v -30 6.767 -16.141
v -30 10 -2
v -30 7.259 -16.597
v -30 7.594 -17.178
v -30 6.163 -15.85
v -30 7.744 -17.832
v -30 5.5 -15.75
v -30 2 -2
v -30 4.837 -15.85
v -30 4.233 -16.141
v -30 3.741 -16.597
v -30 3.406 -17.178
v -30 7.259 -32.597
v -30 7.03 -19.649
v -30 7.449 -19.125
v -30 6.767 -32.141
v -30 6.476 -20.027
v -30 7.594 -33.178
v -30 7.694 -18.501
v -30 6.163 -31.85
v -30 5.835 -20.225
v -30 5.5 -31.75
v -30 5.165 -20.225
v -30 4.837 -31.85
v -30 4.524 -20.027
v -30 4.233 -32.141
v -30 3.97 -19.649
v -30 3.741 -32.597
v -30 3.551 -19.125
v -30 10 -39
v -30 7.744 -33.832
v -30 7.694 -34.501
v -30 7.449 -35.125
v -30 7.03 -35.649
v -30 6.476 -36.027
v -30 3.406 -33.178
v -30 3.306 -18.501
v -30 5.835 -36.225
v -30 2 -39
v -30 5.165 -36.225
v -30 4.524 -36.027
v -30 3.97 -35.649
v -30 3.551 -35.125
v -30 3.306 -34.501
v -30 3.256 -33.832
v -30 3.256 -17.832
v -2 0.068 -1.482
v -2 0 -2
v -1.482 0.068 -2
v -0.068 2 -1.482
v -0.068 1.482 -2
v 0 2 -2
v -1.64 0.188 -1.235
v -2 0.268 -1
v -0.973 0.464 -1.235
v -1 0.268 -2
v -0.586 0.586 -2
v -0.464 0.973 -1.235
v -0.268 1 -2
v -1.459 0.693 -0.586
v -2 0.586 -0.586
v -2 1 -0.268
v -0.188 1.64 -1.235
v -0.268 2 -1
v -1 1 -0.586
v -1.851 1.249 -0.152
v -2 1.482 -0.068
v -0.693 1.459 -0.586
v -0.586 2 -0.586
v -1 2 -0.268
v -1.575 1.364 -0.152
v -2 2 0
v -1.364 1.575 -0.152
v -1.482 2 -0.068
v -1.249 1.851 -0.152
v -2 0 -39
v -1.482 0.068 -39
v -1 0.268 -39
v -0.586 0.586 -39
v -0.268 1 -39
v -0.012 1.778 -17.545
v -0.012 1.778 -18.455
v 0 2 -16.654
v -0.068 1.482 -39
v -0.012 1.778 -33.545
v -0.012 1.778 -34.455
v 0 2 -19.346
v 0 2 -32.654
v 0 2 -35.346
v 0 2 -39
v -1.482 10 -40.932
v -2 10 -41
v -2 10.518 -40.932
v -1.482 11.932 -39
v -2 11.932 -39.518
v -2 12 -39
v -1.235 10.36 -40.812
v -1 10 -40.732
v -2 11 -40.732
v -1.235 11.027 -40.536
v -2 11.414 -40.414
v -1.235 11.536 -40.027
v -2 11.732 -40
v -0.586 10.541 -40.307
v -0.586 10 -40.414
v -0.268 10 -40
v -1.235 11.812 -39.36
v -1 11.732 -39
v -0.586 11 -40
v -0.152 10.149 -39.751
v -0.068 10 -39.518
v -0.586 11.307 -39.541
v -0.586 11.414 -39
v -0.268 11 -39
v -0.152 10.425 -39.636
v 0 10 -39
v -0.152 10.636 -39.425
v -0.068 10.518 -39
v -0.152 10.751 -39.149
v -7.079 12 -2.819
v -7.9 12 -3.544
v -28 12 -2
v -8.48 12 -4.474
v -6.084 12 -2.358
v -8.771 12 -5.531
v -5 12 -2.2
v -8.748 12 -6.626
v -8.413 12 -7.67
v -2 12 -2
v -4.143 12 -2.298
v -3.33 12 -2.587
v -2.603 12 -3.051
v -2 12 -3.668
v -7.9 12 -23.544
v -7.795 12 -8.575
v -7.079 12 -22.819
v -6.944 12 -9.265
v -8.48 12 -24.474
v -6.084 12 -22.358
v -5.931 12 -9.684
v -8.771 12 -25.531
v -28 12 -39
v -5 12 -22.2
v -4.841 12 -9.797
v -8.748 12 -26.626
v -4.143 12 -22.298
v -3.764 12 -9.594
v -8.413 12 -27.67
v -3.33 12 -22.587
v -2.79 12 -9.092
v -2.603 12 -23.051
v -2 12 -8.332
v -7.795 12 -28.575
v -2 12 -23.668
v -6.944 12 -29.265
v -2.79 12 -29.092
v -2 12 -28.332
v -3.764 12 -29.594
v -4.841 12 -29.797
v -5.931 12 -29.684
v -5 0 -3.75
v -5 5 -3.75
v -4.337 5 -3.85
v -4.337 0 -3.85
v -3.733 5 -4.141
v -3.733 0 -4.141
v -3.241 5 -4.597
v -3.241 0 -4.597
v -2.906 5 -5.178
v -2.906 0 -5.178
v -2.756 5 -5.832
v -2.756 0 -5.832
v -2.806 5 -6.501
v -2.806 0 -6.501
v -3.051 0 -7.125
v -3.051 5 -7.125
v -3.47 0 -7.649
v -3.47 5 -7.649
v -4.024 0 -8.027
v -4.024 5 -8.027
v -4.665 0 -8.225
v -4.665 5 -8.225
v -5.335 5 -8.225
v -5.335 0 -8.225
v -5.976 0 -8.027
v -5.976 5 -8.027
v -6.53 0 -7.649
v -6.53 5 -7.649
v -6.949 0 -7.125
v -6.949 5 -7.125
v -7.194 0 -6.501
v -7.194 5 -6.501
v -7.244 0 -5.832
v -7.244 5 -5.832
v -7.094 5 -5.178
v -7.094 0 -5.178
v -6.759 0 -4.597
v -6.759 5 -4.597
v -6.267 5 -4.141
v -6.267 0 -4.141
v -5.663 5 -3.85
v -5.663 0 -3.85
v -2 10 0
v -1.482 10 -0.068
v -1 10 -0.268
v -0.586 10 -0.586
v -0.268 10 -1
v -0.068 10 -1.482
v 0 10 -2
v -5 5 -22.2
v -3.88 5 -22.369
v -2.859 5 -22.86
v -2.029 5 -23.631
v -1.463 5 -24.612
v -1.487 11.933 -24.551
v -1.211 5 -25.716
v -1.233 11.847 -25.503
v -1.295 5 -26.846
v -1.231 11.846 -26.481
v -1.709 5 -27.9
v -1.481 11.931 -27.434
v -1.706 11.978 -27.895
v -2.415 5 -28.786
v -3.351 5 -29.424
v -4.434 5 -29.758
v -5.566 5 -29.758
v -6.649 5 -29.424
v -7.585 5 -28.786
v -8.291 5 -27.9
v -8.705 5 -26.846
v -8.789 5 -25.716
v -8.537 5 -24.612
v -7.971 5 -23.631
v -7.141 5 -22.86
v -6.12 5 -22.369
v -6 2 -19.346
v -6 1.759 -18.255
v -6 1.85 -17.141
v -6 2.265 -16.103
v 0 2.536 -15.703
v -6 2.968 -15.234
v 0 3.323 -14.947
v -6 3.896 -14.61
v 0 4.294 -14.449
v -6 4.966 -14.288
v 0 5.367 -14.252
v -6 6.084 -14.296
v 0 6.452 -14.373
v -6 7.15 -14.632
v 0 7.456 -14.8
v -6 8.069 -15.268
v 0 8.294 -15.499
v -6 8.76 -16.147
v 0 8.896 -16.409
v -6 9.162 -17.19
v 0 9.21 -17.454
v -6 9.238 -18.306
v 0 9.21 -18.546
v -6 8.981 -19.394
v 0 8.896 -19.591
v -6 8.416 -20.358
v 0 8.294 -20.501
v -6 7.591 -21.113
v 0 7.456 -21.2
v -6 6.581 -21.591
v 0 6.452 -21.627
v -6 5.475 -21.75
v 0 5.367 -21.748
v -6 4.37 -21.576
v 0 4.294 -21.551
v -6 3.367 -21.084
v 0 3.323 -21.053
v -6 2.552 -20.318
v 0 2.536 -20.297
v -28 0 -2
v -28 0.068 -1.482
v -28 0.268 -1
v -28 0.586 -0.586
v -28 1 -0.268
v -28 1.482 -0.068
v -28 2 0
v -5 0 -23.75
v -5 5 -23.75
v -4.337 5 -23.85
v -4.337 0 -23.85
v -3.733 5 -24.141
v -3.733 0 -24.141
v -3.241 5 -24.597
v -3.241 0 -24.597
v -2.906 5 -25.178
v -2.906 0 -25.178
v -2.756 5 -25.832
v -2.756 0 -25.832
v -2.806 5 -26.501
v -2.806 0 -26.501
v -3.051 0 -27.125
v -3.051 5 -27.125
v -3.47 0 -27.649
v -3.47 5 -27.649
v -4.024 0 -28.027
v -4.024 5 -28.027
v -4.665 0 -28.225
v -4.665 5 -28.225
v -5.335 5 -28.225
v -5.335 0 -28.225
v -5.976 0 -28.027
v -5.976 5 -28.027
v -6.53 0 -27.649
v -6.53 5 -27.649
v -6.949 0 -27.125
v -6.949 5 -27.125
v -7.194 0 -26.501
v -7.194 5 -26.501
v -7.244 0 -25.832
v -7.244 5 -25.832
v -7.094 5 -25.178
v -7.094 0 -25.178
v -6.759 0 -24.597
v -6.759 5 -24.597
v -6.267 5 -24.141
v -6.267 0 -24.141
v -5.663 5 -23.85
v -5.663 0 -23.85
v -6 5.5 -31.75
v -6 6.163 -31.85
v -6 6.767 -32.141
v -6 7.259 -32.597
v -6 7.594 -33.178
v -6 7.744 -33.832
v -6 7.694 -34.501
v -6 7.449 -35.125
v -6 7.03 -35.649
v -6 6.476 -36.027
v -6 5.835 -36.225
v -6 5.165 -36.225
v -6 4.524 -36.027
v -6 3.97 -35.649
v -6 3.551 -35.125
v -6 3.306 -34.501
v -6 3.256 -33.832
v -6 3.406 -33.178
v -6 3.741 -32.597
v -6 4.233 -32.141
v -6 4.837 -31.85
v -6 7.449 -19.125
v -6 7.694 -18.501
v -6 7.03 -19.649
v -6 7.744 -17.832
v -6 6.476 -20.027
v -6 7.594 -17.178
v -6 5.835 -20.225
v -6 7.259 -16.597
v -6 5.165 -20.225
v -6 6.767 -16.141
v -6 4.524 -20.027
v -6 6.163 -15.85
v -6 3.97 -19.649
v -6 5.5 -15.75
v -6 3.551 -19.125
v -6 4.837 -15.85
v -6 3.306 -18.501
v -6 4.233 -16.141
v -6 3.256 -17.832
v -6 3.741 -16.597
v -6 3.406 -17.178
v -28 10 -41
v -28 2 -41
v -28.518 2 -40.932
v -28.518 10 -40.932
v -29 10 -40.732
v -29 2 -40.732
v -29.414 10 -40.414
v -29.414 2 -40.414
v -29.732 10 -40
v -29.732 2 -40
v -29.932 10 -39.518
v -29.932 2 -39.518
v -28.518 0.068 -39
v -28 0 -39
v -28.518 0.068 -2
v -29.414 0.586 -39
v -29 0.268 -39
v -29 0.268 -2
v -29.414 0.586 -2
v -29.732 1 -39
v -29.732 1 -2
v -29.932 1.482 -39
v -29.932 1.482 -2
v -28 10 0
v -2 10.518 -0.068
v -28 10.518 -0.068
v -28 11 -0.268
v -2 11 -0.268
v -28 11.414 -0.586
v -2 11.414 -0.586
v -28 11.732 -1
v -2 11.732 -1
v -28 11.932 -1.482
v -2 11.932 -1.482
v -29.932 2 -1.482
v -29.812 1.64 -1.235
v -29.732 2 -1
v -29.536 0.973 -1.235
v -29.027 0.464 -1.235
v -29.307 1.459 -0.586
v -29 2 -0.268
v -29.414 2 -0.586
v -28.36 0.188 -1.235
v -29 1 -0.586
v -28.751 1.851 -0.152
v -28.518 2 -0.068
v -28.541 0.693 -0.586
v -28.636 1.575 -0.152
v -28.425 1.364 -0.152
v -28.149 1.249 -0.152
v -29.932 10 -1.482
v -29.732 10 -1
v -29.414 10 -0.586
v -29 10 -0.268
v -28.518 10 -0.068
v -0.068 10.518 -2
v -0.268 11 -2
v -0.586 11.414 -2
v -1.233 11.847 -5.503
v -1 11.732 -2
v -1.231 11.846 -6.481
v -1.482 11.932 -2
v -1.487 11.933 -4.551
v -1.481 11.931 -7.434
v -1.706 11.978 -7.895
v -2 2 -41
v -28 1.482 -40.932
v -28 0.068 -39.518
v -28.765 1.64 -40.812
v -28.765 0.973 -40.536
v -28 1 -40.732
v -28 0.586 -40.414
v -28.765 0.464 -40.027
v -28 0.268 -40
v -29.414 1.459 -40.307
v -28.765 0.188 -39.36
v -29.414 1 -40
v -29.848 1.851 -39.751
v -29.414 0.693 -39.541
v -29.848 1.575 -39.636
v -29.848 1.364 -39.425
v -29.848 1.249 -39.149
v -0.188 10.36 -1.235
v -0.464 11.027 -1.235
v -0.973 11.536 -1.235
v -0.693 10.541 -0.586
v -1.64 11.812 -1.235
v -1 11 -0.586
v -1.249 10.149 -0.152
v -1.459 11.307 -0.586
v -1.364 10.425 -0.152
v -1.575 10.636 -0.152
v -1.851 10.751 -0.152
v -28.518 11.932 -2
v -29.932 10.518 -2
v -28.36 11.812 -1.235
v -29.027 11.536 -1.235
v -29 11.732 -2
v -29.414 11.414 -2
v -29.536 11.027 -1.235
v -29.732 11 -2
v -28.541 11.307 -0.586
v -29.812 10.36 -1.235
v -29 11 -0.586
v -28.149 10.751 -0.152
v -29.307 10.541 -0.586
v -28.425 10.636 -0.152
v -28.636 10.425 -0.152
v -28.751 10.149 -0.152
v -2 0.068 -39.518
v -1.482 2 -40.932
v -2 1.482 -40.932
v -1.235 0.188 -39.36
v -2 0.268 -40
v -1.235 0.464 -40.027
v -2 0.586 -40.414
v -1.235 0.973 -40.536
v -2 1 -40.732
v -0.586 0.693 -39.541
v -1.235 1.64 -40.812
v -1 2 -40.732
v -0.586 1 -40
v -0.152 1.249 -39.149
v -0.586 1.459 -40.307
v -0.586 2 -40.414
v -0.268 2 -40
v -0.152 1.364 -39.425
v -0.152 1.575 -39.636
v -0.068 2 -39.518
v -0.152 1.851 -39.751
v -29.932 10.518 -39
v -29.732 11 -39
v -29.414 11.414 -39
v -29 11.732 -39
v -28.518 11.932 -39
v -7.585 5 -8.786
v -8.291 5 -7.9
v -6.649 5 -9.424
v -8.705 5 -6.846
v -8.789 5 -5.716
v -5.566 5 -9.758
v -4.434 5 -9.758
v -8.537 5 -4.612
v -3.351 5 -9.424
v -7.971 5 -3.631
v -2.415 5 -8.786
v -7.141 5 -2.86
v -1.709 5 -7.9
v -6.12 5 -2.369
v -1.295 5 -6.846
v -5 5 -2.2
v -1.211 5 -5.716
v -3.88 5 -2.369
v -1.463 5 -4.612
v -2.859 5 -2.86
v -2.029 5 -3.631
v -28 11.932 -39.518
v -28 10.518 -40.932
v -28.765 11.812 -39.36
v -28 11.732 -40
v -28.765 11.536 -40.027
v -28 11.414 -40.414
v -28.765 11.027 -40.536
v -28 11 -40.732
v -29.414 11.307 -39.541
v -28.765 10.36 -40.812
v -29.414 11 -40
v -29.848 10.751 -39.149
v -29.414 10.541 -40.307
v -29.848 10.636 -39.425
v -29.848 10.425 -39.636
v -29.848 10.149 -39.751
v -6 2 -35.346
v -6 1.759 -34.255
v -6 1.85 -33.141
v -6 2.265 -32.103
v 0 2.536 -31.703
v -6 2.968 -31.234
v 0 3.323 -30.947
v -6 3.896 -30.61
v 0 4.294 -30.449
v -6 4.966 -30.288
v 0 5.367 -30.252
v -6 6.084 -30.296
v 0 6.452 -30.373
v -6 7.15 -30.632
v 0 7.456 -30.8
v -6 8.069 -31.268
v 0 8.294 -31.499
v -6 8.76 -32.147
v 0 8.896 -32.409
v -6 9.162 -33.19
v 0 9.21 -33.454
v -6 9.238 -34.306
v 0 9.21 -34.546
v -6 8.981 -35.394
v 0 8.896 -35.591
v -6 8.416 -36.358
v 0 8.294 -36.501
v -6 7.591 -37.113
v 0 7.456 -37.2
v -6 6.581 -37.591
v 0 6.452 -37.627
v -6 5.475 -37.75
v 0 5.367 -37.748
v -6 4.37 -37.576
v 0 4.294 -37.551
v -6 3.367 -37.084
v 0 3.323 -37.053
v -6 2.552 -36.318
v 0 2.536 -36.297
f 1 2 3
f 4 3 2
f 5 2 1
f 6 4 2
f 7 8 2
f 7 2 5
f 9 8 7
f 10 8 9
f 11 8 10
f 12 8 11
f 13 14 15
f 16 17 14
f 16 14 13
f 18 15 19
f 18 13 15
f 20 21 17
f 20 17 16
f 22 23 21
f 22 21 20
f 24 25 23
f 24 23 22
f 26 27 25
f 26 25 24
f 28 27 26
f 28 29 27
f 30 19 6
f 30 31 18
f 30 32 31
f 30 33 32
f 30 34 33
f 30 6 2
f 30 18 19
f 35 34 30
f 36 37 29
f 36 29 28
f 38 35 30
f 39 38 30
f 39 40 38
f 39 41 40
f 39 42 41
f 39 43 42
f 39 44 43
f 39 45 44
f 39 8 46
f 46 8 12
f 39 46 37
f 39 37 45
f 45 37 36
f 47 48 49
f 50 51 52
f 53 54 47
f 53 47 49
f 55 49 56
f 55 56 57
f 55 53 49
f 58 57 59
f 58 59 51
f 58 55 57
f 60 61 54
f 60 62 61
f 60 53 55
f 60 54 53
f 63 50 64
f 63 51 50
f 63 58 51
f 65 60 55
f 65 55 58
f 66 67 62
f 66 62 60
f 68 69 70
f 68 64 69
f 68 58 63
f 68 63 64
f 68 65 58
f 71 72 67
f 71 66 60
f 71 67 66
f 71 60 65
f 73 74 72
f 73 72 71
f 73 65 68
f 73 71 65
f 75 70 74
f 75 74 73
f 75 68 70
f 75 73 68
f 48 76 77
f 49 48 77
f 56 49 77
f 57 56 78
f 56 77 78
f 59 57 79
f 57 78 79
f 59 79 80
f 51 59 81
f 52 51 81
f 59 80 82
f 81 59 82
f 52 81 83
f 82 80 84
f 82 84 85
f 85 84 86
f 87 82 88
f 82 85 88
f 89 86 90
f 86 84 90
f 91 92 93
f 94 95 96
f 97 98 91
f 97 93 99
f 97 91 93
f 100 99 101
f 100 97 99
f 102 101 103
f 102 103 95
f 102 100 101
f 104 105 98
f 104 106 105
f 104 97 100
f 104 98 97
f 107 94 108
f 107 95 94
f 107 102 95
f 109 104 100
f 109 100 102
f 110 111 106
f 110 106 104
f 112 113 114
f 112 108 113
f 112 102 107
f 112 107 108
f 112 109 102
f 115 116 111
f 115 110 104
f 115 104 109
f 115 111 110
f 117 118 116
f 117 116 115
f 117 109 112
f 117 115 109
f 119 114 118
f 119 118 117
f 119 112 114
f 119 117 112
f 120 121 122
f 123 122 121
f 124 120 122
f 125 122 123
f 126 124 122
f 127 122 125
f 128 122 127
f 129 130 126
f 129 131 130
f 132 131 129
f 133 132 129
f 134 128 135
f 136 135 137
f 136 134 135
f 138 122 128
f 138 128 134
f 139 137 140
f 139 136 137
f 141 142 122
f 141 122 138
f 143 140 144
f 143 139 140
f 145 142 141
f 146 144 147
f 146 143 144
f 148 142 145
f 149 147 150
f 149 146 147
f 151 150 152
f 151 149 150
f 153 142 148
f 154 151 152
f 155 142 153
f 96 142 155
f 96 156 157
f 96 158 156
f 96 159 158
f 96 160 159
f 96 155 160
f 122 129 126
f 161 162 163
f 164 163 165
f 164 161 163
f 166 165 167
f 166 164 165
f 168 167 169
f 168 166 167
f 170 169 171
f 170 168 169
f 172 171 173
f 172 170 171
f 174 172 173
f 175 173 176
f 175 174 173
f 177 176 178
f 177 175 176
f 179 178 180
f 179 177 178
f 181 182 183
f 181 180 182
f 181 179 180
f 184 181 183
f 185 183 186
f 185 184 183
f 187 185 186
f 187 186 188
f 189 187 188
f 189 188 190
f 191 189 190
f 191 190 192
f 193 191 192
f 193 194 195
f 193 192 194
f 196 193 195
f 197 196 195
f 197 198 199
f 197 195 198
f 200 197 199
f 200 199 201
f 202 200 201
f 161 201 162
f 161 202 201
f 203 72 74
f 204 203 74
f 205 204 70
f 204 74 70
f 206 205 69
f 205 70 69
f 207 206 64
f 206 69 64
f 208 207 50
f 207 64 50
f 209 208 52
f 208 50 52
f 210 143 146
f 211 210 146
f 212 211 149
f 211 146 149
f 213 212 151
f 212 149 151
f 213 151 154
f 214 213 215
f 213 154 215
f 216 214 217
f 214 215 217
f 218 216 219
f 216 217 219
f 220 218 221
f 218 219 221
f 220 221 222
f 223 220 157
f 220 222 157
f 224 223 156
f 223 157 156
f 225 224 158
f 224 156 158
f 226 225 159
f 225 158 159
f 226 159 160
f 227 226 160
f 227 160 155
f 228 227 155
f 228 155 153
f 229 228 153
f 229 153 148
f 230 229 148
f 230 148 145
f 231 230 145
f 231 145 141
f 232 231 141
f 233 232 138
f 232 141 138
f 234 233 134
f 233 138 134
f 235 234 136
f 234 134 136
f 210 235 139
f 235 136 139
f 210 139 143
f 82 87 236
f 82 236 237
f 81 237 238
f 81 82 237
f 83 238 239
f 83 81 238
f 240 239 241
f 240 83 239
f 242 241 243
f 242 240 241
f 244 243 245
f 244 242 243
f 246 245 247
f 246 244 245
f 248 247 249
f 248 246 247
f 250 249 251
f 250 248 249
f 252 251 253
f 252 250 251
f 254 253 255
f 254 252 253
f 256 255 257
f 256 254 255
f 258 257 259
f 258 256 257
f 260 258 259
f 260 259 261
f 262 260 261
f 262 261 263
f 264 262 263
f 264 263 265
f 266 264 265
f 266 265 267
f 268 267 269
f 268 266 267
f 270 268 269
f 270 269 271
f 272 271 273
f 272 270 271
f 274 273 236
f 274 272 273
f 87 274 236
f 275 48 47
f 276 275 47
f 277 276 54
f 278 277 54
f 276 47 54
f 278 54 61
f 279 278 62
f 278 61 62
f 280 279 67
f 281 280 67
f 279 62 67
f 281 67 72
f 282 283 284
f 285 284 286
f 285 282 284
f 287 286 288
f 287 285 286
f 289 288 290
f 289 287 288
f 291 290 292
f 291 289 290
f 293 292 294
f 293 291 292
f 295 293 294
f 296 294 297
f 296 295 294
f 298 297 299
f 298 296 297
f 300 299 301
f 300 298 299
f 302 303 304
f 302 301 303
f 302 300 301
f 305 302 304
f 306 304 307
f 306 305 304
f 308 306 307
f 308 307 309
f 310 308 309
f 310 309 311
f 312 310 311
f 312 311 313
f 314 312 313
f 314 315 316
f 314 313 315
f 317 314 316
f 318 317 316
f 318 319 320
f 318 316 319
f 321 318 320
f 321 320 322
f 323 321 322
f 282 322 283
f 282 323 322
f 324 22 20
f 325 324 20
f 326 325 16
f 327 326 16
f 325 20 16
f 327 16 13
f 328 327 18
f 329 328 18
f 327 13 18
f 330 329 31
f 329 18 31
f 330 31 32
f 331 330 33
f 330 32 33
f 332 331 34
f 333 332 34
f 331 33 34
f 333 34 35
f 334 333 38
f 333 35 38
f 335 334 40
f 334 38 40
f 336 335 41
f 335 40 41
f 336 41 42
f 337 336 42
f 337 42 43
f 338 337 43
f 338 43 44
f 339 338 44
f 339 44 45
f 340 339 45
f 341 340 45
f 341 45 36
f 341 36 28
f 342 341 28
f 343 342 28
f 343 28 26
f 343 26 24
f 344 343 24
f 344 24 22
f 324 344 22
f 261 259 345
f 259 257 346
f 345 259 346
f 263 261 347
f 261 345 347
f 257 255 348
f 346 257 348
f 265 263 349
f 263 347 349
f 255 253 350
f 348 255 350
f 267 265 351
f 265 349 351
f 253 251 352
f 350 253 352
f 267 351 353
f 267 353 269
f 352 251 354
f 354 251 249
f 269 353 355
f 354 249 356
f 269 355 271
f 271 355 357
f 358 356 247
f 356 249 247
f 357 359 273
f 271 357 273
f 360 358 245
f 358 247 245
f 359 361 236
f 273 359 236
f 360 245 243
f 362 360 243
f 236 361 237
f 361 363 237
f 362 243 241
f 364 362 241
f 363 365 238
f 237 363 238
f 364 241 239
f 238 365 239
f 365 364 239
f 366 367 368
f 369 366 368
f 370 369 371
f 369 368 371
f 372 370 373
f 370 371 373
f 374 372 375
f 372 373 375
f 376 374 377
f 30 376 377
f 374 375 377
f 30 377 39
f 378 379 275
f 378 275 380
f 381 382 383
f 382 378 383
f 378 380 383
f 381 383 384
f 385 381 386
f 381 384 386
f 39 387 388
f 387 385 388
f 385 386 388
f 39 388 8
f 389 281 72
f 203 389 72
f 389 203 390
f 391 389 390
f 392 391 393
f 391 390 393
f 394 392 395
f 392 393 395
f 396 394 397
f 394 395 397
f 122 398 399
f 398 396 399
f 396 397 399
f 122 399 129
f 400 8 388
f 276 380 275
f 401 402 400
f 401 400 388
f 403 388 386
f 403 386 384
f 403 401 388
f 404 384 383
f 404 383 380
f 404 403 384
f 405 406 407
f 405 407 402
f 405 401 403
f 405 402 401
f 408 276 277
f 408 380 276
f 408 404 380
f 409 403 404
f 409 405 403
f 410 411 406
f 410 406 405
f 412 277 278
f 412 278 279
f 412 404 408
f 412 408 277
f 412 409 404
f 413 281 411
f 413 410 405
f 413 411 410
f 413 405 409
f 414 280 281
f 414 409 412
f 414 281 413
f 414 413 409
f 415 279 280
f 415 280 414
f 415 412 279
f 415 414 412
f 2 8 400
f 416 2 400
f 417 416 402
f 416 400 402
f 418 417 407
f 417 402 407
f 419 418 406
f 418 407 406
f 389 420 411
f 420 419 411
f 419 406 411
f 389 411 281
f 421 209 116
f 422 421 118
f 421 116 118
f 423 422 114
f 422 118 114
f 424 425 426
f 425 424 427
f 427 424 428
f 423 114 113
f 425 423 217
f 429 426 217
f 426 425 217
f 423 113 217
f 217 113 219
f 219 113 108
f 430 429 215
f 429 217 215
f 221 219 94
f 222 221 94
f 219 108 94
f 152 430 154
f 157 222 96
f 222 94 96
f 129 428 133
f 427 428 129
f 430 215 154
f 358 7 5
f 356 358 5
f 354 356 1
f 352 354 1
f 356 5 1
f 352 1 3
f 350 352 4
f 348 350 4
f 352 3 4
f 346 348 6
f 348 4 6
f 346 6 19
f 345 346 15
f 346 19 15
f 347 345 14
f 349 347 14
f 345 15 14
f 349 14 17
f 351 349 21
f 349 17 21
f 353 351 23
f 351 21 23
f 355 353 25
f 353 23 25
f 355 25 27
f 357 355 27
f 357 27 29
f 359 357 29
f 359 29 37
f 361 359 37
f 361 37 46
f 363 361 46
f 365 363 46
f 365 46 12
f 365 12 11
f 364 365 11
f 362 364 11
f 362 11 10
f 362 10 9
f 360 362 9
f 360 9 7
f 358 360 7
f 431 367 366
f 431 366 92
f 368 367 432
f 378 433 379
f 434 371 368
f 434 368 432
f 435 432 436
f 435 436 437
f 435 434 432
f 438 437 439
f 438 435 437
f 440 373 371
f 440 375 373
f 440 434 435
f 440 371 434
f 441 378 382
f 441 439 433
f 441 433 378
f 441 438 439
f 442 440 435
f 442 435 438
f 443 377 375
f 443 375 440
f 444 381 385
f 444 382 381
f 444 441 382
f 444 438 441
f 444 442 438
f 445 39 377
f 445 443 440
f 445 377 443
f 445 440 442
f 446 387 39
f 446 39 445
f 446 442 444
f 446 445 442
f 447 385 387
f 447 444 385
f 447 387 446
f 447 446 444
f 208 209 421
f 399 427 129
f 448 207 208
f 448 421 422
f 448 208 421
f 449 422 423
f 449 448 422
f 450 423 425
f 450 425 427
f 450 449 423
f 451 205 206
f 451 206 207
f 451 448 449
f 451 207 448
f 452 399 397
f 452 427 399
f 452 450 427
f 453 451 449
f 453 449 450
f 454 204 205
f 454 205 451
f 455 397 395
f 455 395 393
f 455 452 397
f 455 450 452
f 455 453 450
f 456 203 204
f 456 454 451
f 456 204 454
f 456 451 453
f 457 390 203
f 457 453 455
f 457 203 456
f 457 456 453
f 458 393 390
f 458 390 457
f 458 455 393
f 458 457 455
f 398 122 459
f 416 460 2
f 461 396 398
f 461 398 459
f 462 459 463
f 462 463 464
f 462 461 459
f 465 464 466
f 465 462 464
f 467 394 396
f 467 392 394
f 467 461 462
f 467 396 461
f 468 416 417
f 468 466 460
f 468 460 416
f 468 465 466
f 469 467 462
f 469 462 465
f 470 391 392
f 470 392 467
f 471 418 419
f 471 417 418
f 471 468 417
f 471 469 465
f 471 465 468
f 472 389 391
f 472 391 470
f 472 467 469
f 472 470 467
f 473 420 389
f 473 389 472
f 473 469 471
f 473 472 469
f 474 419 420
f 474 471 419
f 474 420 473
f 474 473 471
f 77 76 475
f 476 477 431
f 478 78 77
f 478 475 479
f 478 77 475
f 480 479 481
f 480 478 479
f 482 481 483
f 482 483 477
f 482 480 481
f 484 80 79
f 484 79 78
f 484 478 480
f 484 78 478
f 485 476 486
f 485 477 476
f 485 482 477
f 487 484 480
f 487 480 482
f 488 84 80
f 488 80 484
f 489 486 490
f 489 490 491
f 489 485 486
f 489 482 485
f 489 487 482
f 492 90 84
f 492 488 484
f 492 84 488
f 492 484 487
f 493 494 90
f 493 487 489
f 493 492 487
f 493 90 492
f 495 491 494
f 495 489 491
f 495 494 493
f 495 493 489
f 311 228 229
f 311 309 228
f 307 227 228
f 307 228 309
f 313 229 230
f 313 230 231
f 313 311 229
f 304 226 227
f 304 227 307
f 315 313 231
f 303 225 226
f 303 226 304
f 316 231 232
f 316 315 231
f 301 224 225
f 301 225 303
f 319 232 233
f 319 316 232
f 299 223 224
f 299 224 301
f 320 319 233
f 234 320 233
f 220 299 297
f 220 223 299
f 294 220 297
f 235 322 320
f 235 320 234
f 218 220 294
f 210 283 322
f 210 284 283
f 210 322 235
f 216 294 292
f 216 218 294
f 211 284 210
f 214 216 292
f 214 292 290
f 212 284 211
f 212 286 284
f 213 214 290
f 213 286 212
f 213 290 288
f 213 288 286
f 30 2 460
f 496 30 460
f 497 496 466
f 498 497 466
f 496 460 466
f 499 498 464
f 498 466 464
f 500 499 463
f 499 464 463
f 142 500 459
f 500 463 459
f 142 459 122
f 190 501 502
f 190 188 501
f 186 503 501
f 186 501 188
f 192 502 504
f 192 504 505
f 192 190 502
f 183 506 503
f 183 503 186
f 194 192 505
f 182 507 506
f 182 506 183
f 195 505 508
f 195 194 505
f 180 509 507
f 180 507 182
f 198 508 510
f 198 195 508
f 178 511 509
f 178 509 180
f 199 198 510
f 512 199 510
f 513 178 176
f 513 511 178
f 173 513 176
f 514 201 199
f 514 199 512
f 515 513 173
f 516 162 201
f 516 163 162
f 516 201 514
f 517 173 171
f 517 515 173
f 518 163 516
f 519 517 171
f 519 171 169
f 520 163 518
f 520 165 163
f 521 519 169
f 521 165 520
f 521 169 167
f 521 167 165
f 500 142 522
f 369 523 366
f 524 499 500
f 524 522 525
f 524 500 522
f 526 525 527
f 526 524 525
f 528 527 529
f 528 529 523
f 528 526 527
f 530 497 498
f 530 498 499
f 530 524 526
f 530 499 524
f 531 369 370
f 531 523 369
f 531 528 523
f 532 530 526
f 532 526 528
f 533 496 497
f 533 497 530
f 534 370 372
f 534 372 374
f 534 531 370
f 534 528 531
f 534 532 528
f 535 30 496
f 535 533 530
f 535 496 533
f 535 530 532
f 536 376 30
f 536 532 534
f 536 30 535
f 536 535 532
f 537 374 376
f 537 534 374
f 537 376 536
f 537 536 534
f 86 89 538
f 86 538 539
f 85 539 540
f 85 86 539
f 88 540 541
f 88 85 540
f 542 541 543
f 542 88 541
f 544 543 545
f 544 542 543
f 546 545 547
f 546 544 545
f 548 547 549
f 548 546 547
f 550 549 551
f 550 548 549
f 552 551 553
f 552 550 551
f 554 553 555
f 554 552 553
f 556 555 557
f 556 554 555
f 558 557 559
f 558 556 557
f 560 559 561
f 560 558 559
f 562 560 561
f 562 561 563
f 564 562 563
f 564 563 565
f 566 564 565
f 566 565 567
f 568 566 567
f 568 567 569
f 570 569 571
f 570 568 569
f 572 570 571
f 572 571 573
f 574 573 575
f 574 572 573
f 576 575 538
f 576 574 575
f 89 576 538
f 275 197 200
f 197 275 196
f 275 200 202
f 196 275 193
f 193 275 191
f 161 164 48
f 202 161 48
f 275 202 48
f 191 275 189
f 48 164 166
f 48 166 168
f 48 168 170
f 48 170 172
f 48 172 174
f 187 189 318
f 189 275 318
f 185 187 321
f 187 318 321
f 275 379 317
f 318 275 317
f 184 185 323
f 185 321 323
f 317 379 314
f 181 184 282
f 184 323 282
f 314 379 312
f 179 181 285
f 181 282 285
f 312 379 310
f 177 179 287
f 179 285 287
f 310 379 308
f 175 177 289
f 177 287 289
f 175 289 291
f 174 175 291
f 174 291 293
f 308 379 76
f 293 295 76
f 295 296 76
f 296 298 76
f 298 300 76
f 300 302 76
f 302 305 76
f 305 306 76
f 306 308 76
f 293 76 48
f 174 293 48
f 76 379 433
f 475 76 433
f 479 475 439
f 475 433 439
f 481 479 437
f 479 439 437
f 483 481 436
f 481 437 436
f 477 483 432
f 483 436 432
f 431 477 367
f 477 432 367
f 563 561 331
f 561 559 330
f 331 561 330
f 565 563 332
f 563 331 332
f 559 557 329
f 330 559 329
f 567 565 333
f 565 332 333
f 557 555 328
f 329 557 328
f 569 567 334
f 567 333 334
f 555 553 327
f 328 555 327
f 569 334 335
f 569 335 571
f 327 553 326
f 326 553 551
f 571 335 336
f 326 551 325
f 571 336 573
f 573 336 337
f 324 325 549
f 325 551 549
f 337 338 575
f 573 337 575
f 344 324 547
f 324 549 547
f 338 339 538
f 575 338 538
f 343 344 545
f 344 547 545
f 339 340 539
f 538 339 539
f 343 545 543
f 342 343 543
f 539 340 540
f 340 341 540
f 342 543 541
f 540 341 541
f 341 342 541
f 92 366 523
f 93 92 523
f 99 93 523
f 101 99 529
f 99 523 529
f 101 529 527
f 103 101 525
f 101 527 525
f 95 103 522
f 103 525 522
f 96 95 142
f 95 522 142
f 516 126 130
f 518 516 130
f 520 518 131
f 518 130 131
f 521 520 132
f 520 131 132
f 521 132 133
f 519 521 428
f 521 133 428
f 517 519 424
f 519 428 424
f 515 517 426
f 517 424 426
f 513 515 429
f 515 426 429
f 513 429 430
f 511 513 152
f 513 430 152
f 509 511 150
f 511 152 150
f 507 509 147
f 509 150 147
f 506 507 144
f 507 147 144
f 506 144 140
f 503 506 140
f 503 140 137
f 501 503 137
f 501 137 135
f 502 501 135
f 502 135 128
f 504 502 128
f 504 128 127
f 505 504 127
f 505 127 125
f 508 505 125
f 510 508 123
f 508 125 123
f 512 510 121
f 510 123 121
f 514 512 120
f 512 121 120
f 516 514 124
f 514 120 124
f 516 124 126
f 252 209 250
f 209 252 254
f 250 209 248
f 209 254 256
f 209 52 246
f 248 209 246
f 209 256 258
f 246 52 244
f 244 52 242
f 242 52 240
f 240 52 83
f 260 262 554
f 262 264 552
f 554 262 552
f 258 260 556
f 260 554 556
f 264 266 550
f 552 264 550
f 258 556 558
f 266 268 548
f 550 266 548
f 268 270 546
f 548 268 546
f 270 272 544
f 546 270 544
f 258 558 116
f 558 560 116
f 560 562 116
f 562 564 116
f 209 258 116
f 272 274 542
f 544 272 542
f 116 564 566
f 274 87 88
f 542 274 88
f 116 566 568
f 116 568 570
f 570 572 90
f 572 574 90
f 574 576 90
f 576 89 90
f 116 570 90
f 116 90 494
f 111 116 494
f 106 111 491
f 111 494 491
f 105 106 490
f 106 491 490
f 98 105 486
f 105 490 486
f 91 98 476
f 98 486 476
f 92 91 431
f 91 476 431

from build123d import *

# Parameters (mm, degrees)
SKETCH1_W           = 30
SKETCH1_H           = 41
SKETCH1_R           = 2.25
BOSS_EXTRUDE1_DEPTH = 12
SKETCH3_R           = 3.8
CUT_EXTRUDE2_DEPTH  = 7
FILLET1_R           = 2
SKETCH4_R           = 2.25
CUT_EXTRUDE3_DEPTH  = 53.201532625
CUT_EXTRUDE4_START  = -30
SKETCH5_R           = 3.75
CUT_EXTRUDE4_DEPTH  = 6


with BuildPart() as part:
    # Sketch1 → Boss-Extrude1 (new body)
    with BuildSketch(Plane(origin=(0, 0, 0), x_dir=(1, 0, 0), z_dir=(0, 1, 0))):
        with Locations((-15, 20.5)):
            Rectangle(SKETCH1_W, SKETCH1_H)
        with Locations(Location((-5, 6, 0), (0, 0, 270))):
            Circle(SKETCH1_R, mode=Mode.SUBTRACT)
        with Locations(Location((-5, 26, 0), (0, 0, 270))):
            Circle(SKETCH1_R, mode=Mode.SUBTRACT)
    extrude(amount=BOSS_EXTRUDE1_DEPTH)

    # Sketch3 → Cut-Extrude2 (cut)
    with BuildSketch(Plane(origin=(0, 12, 0), x_dir=(1, 0, 0), z_dir=(0, 1, 0))):
        with Locations(Location((-5, 26, 0), (0, 0, 270))):
            Circle(SKETCH3_R)
        with Locations(Location((-5, 6, 0), (0, 0, 270))):
            Circle(SKETCH3_R)
    extrude(amount=-CUT_EXTRUDE2_DEPTH, mode=Mode.SUBTRACT)

    # Fillet1
    # the kernel refuses this fillet: 2 mm, written as the material it takes off along each edge
    with BuildSketch(Plane(origin=(-28, 10, -2), x_dir=(-1, 0, 0), z_dir=(0, 0, 1))) as fillet1_piece_1_section:
        Polygon((0, 0), (FILLET1_R, 0), (FILLET1_R, -FILLET1_R), (0, -FILLET1_R), align=None)
    fillet1_piece_1 = extrude(amount=FILLET1_R, mode=Mode.PRIVATE)
    fillet1_piece_1 = fillet1_piece_1 - Plane(origin=(-28, 10, -2), x_dir=(0.7071067811865475, -0.7071067811865475, 0), z_dir=(0, 0, 1)) * Sphere(FILLET1_R, mode=Mode.PRIVATE)
    add(fillet1_piece_1, mode=Mode.SUBTRACT)
    with BuildSketch(Plane(origin=(-28, 10, -39), x_dir=(0, 1, 0), z_dir=(-1, 0, 0))) as fillet1_piece_2_section:
        Polygon((0, 0), (FILLET1_R, 0), (FILLET1_R, FILLET1_R), (0, FILLET1_R), align=None)
    fillet1_piece_2 = extrude(amount=FILLET1_R, mode=Mode.PRIVATE)
    fillet1_piece_2 = fillet1_piece_2 - Plane(origin=(-28, 10, -39), x_dir=(0, -0.7071067811865475, 0.7071067811865475), z_dir=(-1, 0, 0)) * Sphere(FILLET1_R, mode=Mode.PRIVATE)
    add(fillet1_piece_2, mode=Mode.SUBTRACT)
    with BuildSketch(Plane(origin=(-2, 10, -2), x_dir=(1, 0, 0), z_dir=(0, 0, 1))) as fillet1_piece_3_section:
        Polygon((0, 0), (FILLET1_R, 0), (FILLET1_R, FILLET1_R), (0, FILLET1_R), align=None)
    fillet1_piece_3 = extrude(amount=FILLET1_R, mode=Mode.PRIVATE)
    fillet1_piece_3 = fillet1_piece_3 - Plane(origin=(-2, 10, -2), x_dir=(-0.7071067811865475, -0.7071067811865475, 0), z_dir=(0, 0, 1)) * Sphere(FILLET1_R, mode=Mode.PRIVATE)
    add(fillet1_piece_3, mode=Mode.SUBTRACT)
    with BuildSketch(Plane(origin=(-2, 10, -39), x_dir=(0, 1, 0), z_dir=(1, 0, 0))) as fillet1_piece_4_section:
        Polygon((0, 0), (FILLET1_R, 0), (FILLET1_R, -FILLET1_R), (0, -FILLET1_R), align=None)
    fillet1_piece_4 = extrude(amount=FILLET1_R, mode=Mode.PRIVATE)
    fillet1_piece_4 = fillet1_piece_4 - Plane(origin=(-2, 10, -39), x_dir=(0, -0.7071067811865475, 0.7071067811865475), z_dir=(1, 0, 0)) * Sphere(FILLET1_R, mode=Mode.PRIVATE)
    add(fillet1_piece_4, mode=Mode.SUBTRACT)
    with BuildSketch(Plane(origin=(-2, 2, -2), x_dir=(1, 0, 0), z_dir=(0, 0, 1))) as fillet1_piece_5_section:
        Polygon((0, 0), (FILLET1_R, 0), (FILLET1_R, -FILLET1_R), (0, -FILLET1_R), align=None)
    fillet1_piece_5 = extrude(amount=FILLET1_R, mode=Mode.PRIVATE)
    fillet1_piece_5 = fillet1_piece_5 - Plane(origin=(-2, 2, -2), x_dir=(-0.7071067811865475, 0.7071067811865475, 0), z_dir=(0, 0, 1)) * Sphere(FILLET1_R, mode=Mode.PRIVATE)
    add(fillet1_piece_5, mode=Mode.SUBTRACT)
    with BuildSketch(Plane(origin=(-28, 2, -2), x_dir=(-1, 0, 0), z_dir=(0, 0, 1))) as fillet1_piece_6_section:
        Polygon((0, 0), (FILLET1_R, 0), (FILLET1_R, FILLET1_R), (0, FILLET1_R), align=None)
    fillet1_piece_6 = extrude(amount=FILLET1_R, mode=Mode.PRIVATE)
    fillet1_piece_6 = fillet1_piece_6 - Plane(origin=(-28, 2, -2), x_dir=(0.7071067811865475, 0.7071067811865475, 0), z_dir=(0, 0, 1)) * Sphere(FILLET1_R, mode=Mode.PRIVATE)
    add(fillet1_piece_6, mode=Mode.SUBTRACT)
    with BuildSketch(Plane(origin=(-28, 2, -39), x_dir=(0, -1, 0), z_dir=(-1, 0, 0))) as fillet1_piece_7_section:
        Polygon((0, 0), (FILLET1_R, 0), (FILLET1_R, -FILLET1_R), (0, -FILLET1_R), align=None)
    fillet1_piece_7 = extrude(amount=FILLET1_R, mode=Mode.PRIVATE)
    fillet1_piece_7 = fillet1_piece_7 - Plane(origin=(-28, 2, -39), x_dir=(0, 0.7071067811865475, 0.7071067811865475), z_dir=(-1, 0, 0)) * Sphere(FILLET1_R, mode=Mode.PRIVATE)
    add(fillet1_piece_7, mode=Mode.SUBTRACT)
    with BuildSketch(Plane(origin=(-2, 2, -39), x_dir=(0, -1, 0), z_dir=(1, 0, 0))) as fillet1_piece_8_section:
        Polygon((0, 0), (FILLET1_R, 0), (FILLET1_R, FILLET1_R), (0, FILLET1_R), align=None)
    fillet1_piece_8 = extrude(amount=FILLET1_R, mode=Mode.PRIVATE)
    fillet1_piece_8 = fillet1_piece_8 - Plane(origin=(-2, 2, -39), x_dir=(0, 0.7071067811865475, 0.7071067811865475), z_dir=(1, 0, 0)) * Sphere(FILLET1_R, mode=Mode.PRIVATE)
    add(fillet1_piece_8, mode=Mode.SUBTRACT)
    with BuildSketch(Plane(origin=(-30, 12, -2), x_dir=(0, -1, 0), z_dir=(0, 0, -1)), Plane(origin=(0, 12, -39), x_dir=(0, -1, 0), z_dir=(0, 0, 1))) as fillet1_piece_9:
        with BuildLine():
            CenterArc((FILLET1_R, -FILLET1_R), FILLET1_R, 90, 90)
            Line((0, -FILLET1_R), (0, 0))
            Line((0, 0), (FILLET1_R, 0))
        make_face()
    extrude(amount=37, mode=Mode.SUBTRACT)
    with BuildSketch(Plane(origin=(-2, 12, 0), x_dir=(0, -1, 0), z_dir=(-1, 0, 0)), Plane(origin=(-28, 0, -41), x_dir=(0, 0, 1), z_dir=(1, 0, 0))) as fillet1_piece_10:
        with BuildLine():
            CenterArc((FILLET1_R, -FILLET1_R), FILLET1_R, 90, 90)
            Line((0, -FILLET1_R), (0, 0))
            Line((0, 0), (FILLET1_R, 0))
        make_face()
    extrude(amount=26, mode=Mode.SUBTRACT)
    with BuildSketch(Plane(origin=(-2, 0, 0), x_dir=(0, 1, 0), z_dir=(-1, 0, 0)), Plane(origin=(-28, 12, -41), x_dir=(0, 0, 1), z_dir=(1, 0, 0))) as fillet1_piece_11:
        with BuildLine():
            CenterArc((FILLET1_R, FILLET1_R), FILLET1_R, 180, 90)
            Line((0, FILLET1_R), (0, 0))
            Line((0, 0), (FILLET1_R, 0))
        make_face()
    extrude(amount=26, mode=Mode.SUBTRACT)
    with BuildSketch(Plane(origin=(-30, 0, -2), x_dir=(0, 1, 0), z_dir=(0, 0, -1)), Plane(origin=(0, 0, -39), x_dir=(0, 1, 0), z_dir=(0, 0, 1))) as fillet1_piece_12:
        with BuildLine():
            CenterArc((FILLET1_R, FILLET1_R), FILLET1_R, 180, 90)
            Line((0, FILLET1_R), (0, 0))
            Line((0, 0), (FILLET1_R, 0))
        make_face()
    extrude(amount=37, mode=Mode.SUBTRACT)
    with BuildSketch(Plane(origin=(0, 2, 0), x_dir=(-1, 0, 0), z_dir=(0, 1, 0)), Plane(origin=(0, 2, -41), x_dir=(0, 0, 1), z_dir=(0, 1, 0))) as fillet1_piece_13:
        with BuildLine():
            CenterArc((FILLET1_R, -FILLET1_R), FILLET1_R, 90, 90)
            Line((0, -FILLET1_R), (0, 0))
            Line((0, 0), (FILLET1_R, 0))
        make_face()
    extrude(amount=8, mode=Mode.SUBTRACT)
    with BuildSketch(Plane(origin=(-30, 2, 0), x_dir=(1, 0, 0), z_dir=(0, 1, 0)), Plane(origin=(-30, 2, -41), x_dir=(0, 0, 1), z_dir=(0, 1, 0))) as fillet1_piece_14:
        with BuildLine():
            CenterArc((FILLET1_R, FILLET1_R), FILLET1_R, 180, 90)
            Line((0, FILLET1_R), (0, 0))
            Line((0, 0), (FILLET1_R, 0))
        make_face()
    extrude(amount=8, mode=Mode.SUBTRACT)

    # Sketch4 → Cut-Extrude3 (cut, through all)
    with BuildSketch(Plane.ZY.offset(30)):
        with Locations((-34, 5.5)):
            Circle(SKETCH4_R)
        with Locations((-18, 5.5)):
            Circle(SKETCH4_R)
    extrude(amount=-CUT_EXTRUDE3_DEPTH, mode=Mode.SUBTRACT)

    # Sketch5 → Cut-Extrude4 (cut)
    with BuildSketch(Plane.ZY.offset(30).offset(CUT_EXTRUDE4_START)):
        with Locations(Location((-34, 5.5, 0), (0, 0, 248.960530219))):
            Circle(SKETCH5_R)
        with Locations(Location((-18, 5.5, 0), (0, 0, 248.960530219))):
            Circle(SKETCH5_R)
    extrude(amount=CUT_EXTRUDE4_DEPTH, mode=Mode.SUBTRACT)


solid = part.part
